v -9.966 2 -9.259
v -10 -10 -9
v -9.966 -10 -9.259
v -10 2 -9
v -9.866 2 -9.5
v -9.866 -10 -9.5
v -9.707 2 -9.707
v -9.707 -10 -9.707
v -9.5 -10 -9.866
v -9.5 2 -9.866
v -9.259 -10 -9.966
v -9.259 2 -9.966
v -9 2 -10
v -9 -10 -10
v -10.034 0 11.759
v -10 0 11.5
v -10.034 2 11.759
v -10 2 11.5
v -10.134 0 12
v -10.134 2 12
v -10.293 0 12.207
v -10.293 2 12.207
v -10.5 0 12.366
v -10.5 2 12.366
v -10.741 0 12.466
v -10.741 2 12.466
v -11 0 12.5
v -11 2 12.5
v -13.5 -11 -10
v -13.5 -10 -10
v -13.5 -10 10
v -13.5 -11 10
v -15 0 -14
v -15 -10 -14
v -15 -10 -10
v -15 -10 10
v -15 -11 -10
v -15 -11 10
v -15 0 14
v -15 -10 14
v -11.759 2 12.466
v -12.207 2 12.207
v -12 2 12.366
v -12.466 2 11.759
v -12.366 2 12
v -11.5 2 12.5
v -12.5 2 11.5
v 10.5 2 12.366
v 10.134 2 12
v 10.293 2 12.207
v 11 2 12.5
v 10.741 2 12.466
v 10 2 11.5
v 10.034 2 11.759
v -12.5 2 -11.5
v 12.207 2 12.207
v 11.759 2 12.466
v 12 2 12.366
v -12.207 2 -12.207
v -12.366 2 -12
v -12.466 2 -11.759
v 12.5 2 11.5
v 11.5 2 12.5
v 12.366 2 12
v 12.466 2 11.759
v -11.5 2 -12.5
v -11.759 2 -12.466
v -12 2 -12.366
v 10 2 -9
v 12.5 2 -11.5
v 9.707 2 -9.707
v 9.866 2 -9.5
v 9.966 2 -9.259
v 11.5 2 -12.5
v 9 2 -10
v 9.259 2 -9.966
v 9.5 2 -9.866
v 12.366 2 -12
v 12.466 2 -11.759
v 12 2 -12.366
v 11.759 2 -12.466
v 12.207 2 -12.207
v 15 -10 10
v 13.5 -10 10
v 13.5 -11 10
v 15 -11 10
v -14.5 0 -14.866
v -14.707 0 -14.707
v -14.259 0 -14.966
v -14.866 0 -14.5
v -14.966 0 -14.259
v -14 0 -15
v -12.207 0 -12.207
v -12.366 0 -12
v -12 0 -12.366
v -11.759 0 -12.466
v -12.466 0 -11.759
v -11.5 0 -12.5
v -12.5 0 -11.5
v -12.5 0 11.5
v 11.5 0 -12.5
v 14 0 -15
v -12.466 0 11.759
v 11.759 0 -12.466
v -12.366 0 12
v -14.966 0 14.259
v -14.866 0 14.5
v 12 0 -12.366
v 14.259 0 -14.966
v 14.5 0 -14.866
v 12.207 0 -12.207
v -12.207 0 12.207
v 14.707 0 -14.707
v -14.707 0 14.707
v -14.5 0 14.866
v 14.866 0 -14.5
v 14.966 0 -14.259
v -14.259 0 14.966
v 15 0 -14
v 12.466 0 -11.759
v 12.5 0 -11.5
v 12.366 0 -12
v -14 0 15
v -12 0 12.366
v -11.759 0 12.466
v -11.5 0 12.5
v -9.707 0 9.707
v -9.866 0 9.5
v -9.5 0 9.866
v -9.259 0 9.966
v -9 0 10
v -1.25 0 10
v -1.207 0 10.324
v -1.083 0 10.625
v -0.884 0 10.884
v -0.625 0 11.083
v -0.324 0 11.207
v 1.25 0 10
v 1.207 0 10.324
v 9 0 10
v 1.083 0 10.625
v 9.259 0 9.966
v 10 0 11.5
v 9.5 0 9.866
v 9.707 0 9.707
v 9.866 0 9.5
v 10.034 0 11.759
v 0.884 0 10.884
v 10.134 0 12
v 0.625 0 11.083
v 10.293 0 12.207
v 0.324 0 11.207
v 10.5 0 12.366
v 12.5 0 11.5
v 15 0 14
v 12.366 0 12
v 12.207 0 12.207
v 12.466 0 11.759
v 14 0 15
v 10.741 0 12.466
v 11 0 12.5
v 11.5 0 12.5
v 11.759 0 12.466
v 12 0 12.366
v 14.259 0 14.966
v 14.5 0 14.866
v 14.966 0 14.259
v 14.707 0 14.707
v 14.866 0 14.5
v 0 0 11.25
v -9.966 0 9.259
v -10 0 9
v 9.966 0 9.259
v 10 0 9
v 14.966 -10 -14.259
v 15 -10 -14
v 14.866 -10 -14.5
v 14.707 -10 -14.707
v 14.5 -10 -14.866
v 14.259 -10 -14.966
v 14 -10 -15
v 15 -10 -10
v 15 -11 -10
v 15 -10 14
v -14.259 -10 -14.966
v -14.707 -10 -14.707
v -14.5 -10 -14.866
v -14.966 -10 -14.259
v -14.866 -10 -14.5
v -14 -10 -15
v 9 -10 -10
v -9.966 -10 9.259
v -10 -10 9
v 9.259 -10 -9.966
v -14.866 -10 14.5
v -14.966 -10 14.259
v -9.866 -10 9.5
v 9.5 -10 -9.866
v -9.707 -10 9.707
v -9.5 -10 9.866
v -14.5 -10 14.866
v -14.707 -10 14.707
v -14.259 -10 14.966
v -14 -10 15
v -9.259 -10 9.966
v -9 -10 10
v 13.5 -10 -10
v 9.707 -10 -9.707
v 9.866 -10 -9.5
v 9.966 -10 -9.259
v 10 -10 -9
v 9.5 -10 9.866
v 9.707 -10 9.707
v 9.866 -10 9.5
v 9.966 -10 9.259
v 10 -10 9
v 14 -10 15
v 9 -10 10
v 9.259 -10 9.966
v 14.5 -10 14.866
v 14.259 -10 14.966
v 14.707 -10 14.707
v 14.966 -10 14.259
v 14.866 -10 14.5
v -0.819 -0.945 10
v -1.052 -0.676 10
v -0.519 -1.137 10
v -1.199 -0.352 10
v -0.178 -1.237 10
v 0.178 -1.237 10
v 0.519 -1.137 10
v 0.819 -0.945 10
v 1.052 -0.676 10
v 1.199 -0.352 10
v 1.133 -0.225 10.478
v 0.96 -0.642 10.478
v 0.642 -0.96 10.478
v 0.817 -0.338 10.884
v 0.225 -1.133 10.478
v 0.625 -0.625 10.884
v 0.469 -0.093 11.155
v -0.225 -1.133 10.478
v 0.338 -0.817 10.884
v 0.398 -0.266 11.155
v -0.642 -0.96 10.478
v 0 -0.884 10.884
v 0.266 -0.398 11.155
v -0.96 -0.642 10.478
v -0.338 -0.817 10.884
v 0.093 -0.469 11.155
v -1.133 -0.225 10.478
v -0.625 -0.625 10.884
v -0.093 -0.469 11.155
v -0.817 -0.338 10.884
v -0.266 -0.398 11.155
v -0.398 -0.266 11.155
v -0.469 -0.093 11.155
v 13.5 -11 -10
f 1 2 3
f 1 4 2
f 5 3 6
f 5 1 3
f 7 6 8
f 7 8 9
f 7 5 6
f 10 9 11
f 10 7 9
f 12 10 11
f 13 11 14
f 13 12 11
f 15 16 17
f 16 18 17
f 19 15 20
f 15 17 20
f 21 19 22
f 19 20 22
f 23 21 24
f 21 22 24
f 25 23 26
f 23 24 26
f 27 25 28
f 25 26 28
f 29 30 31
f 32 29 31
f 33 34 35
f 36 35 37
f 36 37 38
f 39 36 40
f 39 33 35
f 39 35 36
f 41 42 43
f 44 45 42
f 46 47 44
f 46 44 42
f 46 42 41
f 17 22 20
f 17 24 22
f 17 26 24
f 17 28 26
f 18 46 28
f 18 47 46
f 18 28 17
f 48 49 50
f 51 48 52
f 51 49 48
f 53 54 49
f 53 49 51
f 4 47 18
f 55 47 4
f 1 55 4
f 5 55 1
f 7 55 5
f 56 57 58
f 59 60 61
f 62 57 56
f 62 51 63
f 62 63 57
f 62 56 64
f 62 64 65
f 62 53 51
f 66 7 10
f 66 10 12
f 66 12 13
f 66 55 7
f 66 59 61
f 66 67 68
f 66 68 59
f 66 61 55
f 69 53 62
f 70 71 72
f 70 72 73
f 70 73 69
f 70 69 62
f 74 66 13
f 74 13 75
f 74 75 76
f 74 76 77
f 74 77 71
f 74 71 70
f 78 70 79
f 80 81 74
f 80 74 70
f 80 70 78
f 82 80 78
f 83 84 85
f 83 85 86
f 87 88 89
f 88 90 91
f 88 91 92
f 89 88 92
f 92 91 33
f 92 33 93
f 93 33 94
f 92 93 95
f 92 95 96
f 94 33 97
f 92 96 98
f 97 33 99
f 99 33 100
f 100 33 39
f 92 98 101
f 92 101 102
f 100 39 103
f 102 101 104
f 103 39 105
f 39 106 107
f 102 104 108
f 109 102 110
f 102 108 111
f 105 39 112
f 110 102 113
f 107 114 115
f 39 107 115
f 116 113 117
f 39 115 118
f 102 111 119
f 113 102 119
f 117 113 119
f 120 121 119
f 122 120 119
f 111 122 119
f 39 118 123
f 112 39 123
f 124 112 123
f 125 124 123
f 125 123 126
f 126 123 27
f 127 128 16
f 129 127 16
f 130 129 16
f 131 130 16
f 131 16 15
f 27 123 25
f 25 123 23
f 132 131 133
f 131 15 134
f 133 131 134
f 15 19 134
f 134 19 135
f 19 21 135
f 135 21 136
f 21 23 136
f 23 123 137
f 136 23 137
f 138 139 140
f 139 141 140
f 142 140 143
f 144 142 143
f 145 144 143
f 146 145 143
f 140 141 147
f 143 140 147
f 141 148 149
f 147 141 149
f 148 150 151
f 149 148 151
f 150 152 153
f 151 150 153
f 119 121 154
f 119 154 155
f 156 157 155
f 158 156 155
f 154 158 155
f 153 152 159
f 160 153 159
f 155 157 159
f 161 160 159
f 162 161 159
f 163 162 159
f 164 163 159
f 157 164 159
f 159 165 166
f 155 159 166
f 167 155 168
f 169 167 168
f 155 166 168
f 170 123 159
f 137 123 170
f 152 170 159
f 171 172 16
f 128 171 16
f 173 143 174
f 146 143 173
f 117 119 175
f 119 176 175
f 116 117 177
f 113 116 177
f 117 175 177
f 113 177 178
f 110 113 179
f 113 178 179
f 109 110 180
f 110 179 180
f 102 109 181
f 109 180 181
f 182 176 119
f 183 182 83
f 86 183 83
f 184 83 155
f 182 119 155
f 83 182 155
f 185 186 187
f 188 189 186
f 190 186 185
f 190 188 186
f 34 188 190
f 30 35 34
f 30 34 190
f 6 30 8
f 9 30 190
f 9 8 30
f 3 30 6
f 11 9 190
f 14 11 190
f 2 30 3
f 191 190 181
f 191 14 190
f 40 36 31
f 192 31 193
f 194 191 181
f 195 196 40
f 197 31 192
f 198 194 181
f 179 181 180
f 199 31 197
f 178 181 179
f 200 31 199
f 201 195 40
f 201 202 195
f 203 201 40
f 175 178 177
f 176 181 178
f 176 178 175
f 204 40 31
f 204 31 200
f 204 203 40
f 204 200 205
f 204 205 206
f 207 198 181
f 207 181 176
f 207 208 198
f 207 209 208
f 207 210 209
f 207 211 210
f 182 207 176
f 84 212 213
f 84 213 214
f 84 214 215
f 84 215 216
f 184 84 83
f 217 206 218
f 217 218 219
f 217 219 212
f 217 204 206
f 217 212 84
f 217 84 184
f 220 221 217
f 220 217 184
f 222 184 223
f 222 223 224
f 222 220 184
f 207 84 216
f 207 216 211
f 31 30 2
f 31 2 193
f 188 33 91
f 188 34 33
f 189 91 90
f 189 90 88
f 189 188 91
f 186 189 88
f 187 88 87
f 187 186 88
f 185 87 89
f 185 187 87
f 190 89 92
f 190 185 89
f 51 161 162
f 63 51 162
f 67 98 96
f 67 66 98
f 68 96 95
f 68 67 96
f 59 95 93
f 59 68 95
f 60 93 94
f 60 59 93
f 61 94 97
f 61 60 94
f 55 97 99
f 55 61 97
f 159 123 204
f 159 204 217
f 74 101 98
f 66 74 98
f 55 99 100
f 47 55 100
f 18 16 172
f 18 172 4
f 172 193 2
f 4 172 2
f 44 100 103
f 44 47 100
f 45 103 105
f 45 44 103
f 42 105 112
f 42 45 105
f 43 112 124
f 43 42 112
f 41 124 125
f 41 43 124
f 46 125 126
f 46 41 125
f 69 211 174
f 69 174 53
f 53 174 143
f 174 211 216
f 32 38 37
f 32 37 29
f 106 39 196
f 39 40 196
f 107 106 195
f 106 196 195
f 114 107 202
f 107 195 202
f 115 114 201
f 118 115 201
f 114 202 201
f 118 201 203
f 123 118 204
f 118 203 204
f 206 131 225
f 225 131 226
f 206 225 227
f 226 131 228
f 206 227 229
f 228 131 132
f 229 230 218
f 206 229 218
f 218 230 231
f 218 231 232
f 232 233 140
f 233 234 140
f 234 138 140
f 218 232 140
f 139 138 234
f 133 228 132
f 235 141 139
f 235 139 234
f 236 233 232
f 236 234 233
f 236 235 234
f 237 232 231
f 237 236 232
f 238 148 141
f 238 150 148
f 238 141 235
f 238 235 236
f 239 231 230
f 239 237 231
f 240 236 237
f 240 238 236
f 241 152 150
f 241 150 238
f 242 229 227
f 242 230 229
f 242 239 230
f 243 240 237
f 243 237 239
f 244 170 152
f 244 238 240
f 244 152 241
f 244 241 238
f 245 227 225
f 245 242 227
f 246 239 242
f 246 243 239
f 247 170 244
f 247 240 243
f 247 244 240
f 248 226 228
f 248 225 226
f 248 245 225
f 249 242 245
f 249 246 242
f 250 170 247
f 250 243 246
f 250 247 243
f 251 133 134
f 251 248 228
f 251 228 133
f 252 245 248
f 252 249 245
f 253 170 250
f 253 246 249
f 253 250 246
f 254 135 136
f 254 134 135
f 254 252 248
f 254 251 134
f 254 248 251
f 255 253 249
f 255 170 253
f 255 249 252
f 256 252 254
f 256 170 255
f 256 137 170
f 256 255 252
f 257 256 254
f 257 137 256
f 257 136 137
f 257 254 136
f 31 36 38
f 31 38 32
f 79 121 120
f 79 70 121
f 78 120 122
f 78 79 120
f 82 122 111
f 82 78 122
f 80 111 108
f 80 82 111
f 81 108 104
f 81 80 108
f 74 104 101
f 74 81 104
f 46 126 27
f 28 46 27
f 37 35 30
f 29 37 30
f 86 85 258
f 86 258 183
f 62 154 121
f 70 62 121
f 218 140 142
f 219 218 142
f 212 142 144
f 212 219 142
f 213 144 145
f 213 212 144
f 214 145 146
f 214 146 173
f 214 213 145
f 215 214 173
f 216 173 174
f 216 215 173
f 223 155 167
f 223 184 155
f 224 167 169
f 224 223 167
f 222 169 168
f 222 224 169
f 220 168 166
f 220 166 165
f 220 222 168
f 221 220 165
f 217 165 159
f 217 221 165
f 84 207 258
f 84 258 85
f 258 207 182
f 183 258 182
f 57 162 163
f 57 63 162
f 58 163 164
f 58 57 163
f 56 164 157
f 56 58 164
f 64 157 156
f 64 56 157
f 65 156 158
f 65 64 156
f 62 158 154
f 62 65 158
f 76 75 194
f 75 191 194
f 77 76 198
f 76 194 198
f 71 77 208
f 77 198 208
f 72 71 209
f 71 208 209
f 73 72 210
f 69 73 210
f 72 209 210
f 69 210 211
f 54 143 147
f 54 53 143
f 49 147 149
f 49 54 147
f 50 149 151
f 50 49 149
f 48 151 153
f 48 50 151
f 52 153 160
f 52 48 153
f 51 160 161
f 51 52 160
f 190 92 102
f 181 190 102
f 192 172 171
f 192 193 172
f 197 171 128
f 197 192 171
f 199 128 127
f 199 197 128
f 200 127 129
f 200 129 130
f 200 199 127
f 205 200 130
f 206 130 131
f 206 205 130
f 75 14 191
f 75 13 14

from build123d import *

# Parameters (mm, degrees)
BOSS_EXTRUDE1_DEPTH = 2
SKETCH3_W           = 30
SKETCH3_H           = 30
SKETCH3_W_2         = 20
SKETCH3_H_2         = 20
BOSS_EXTRUDE2_DEPTH = 10
SKETCH4_W           = 1.5
SKETCH4_H           = 20
BOSS_EXTRUDE3_DEPTH = 1
FILLET2_R           = 1


with BuildPart() as part:
    # Sketch1 → Boss-Extrude1 (new body)
    with BuildSketch(Plane(origin=(0, 0, 0), x_dir=(1, 0, 0), z_dir=(0, 1, 0))):
        Polygon((-12.5, 12.5), (-12.5, -12.5), (-10, -12.5), (-10, 10), (10, 10), (10, -12.5), (12.5, -12.5), (12.5, 12.5), align=None)
    extrude(amount=BOSS_EXTRUDE1_DEPTH)

    # Sketch3 → Boss-Extrude2 (add)
    with BuildSketch(Plane.XZ):
        Rectangle(SKETCH3_W, SKETCH3_H)
        Rectangle(SKETCH3_W_2, SKETCH3_H_2, mode=Mode.SUBTRACT)
    extrude(amount=BOSS_EXTRUDE2_DEPTH)

    # Sketch4 → Boss-Extrude3 (add)
    with BuildSketch(Plane.XZ.offset(10)):
        with Locations((-14.25, 0)):
            Rectangle(SKETCH4_W, SKETCH4_H)
        with Locations((14.25, 0)):
            Rectangle(SKETCH4_W, SKETCH4_H)
    extrude(amount=BOSS_EXTRUDE3_DEPTH)

    # Sketch5 → Cut-Revolve4 (revolve, cut)
    with BuildSketch(Plane(origin=(0, 0, 0), x_dir=(0, 0, -1), z_dir=(1, 0, 0))):
        with BuildLine():
            Line((-8.75, 0), (-11.25, 0))
            ThreePointArc((-11.25, 0), (-10, -1.25), (-8.75, 0))
        make_face()
    revolve(axis=Axis((0, 0, 1000), (0, 0, -1)), mode=Mode.SUBTRACT)

    # Fillet2
    fillet2_edges = [part.edges().sort_by_distance(p)[0] for p in [
        (-15, -5, 15),
        (15, -5, 15),
        (15, -5, -15),
        (-15, -5, -15),
        (-10, -4, -10),
        (-10, -5, 10),
        (10, -5, 10),
        (10, -4, -10),
        (-10, 1, 12.5),
        (12.5, 1, -12.5),
        (12.5, 1, 12.5),
        (10, 1, 12.5),
        (-12.5, 1, 12.5),
        (-12.5, 1, -12.5),
    ]]
    fillet(fillet2_edges, radius=FILLET2_R)


solid = part.part
